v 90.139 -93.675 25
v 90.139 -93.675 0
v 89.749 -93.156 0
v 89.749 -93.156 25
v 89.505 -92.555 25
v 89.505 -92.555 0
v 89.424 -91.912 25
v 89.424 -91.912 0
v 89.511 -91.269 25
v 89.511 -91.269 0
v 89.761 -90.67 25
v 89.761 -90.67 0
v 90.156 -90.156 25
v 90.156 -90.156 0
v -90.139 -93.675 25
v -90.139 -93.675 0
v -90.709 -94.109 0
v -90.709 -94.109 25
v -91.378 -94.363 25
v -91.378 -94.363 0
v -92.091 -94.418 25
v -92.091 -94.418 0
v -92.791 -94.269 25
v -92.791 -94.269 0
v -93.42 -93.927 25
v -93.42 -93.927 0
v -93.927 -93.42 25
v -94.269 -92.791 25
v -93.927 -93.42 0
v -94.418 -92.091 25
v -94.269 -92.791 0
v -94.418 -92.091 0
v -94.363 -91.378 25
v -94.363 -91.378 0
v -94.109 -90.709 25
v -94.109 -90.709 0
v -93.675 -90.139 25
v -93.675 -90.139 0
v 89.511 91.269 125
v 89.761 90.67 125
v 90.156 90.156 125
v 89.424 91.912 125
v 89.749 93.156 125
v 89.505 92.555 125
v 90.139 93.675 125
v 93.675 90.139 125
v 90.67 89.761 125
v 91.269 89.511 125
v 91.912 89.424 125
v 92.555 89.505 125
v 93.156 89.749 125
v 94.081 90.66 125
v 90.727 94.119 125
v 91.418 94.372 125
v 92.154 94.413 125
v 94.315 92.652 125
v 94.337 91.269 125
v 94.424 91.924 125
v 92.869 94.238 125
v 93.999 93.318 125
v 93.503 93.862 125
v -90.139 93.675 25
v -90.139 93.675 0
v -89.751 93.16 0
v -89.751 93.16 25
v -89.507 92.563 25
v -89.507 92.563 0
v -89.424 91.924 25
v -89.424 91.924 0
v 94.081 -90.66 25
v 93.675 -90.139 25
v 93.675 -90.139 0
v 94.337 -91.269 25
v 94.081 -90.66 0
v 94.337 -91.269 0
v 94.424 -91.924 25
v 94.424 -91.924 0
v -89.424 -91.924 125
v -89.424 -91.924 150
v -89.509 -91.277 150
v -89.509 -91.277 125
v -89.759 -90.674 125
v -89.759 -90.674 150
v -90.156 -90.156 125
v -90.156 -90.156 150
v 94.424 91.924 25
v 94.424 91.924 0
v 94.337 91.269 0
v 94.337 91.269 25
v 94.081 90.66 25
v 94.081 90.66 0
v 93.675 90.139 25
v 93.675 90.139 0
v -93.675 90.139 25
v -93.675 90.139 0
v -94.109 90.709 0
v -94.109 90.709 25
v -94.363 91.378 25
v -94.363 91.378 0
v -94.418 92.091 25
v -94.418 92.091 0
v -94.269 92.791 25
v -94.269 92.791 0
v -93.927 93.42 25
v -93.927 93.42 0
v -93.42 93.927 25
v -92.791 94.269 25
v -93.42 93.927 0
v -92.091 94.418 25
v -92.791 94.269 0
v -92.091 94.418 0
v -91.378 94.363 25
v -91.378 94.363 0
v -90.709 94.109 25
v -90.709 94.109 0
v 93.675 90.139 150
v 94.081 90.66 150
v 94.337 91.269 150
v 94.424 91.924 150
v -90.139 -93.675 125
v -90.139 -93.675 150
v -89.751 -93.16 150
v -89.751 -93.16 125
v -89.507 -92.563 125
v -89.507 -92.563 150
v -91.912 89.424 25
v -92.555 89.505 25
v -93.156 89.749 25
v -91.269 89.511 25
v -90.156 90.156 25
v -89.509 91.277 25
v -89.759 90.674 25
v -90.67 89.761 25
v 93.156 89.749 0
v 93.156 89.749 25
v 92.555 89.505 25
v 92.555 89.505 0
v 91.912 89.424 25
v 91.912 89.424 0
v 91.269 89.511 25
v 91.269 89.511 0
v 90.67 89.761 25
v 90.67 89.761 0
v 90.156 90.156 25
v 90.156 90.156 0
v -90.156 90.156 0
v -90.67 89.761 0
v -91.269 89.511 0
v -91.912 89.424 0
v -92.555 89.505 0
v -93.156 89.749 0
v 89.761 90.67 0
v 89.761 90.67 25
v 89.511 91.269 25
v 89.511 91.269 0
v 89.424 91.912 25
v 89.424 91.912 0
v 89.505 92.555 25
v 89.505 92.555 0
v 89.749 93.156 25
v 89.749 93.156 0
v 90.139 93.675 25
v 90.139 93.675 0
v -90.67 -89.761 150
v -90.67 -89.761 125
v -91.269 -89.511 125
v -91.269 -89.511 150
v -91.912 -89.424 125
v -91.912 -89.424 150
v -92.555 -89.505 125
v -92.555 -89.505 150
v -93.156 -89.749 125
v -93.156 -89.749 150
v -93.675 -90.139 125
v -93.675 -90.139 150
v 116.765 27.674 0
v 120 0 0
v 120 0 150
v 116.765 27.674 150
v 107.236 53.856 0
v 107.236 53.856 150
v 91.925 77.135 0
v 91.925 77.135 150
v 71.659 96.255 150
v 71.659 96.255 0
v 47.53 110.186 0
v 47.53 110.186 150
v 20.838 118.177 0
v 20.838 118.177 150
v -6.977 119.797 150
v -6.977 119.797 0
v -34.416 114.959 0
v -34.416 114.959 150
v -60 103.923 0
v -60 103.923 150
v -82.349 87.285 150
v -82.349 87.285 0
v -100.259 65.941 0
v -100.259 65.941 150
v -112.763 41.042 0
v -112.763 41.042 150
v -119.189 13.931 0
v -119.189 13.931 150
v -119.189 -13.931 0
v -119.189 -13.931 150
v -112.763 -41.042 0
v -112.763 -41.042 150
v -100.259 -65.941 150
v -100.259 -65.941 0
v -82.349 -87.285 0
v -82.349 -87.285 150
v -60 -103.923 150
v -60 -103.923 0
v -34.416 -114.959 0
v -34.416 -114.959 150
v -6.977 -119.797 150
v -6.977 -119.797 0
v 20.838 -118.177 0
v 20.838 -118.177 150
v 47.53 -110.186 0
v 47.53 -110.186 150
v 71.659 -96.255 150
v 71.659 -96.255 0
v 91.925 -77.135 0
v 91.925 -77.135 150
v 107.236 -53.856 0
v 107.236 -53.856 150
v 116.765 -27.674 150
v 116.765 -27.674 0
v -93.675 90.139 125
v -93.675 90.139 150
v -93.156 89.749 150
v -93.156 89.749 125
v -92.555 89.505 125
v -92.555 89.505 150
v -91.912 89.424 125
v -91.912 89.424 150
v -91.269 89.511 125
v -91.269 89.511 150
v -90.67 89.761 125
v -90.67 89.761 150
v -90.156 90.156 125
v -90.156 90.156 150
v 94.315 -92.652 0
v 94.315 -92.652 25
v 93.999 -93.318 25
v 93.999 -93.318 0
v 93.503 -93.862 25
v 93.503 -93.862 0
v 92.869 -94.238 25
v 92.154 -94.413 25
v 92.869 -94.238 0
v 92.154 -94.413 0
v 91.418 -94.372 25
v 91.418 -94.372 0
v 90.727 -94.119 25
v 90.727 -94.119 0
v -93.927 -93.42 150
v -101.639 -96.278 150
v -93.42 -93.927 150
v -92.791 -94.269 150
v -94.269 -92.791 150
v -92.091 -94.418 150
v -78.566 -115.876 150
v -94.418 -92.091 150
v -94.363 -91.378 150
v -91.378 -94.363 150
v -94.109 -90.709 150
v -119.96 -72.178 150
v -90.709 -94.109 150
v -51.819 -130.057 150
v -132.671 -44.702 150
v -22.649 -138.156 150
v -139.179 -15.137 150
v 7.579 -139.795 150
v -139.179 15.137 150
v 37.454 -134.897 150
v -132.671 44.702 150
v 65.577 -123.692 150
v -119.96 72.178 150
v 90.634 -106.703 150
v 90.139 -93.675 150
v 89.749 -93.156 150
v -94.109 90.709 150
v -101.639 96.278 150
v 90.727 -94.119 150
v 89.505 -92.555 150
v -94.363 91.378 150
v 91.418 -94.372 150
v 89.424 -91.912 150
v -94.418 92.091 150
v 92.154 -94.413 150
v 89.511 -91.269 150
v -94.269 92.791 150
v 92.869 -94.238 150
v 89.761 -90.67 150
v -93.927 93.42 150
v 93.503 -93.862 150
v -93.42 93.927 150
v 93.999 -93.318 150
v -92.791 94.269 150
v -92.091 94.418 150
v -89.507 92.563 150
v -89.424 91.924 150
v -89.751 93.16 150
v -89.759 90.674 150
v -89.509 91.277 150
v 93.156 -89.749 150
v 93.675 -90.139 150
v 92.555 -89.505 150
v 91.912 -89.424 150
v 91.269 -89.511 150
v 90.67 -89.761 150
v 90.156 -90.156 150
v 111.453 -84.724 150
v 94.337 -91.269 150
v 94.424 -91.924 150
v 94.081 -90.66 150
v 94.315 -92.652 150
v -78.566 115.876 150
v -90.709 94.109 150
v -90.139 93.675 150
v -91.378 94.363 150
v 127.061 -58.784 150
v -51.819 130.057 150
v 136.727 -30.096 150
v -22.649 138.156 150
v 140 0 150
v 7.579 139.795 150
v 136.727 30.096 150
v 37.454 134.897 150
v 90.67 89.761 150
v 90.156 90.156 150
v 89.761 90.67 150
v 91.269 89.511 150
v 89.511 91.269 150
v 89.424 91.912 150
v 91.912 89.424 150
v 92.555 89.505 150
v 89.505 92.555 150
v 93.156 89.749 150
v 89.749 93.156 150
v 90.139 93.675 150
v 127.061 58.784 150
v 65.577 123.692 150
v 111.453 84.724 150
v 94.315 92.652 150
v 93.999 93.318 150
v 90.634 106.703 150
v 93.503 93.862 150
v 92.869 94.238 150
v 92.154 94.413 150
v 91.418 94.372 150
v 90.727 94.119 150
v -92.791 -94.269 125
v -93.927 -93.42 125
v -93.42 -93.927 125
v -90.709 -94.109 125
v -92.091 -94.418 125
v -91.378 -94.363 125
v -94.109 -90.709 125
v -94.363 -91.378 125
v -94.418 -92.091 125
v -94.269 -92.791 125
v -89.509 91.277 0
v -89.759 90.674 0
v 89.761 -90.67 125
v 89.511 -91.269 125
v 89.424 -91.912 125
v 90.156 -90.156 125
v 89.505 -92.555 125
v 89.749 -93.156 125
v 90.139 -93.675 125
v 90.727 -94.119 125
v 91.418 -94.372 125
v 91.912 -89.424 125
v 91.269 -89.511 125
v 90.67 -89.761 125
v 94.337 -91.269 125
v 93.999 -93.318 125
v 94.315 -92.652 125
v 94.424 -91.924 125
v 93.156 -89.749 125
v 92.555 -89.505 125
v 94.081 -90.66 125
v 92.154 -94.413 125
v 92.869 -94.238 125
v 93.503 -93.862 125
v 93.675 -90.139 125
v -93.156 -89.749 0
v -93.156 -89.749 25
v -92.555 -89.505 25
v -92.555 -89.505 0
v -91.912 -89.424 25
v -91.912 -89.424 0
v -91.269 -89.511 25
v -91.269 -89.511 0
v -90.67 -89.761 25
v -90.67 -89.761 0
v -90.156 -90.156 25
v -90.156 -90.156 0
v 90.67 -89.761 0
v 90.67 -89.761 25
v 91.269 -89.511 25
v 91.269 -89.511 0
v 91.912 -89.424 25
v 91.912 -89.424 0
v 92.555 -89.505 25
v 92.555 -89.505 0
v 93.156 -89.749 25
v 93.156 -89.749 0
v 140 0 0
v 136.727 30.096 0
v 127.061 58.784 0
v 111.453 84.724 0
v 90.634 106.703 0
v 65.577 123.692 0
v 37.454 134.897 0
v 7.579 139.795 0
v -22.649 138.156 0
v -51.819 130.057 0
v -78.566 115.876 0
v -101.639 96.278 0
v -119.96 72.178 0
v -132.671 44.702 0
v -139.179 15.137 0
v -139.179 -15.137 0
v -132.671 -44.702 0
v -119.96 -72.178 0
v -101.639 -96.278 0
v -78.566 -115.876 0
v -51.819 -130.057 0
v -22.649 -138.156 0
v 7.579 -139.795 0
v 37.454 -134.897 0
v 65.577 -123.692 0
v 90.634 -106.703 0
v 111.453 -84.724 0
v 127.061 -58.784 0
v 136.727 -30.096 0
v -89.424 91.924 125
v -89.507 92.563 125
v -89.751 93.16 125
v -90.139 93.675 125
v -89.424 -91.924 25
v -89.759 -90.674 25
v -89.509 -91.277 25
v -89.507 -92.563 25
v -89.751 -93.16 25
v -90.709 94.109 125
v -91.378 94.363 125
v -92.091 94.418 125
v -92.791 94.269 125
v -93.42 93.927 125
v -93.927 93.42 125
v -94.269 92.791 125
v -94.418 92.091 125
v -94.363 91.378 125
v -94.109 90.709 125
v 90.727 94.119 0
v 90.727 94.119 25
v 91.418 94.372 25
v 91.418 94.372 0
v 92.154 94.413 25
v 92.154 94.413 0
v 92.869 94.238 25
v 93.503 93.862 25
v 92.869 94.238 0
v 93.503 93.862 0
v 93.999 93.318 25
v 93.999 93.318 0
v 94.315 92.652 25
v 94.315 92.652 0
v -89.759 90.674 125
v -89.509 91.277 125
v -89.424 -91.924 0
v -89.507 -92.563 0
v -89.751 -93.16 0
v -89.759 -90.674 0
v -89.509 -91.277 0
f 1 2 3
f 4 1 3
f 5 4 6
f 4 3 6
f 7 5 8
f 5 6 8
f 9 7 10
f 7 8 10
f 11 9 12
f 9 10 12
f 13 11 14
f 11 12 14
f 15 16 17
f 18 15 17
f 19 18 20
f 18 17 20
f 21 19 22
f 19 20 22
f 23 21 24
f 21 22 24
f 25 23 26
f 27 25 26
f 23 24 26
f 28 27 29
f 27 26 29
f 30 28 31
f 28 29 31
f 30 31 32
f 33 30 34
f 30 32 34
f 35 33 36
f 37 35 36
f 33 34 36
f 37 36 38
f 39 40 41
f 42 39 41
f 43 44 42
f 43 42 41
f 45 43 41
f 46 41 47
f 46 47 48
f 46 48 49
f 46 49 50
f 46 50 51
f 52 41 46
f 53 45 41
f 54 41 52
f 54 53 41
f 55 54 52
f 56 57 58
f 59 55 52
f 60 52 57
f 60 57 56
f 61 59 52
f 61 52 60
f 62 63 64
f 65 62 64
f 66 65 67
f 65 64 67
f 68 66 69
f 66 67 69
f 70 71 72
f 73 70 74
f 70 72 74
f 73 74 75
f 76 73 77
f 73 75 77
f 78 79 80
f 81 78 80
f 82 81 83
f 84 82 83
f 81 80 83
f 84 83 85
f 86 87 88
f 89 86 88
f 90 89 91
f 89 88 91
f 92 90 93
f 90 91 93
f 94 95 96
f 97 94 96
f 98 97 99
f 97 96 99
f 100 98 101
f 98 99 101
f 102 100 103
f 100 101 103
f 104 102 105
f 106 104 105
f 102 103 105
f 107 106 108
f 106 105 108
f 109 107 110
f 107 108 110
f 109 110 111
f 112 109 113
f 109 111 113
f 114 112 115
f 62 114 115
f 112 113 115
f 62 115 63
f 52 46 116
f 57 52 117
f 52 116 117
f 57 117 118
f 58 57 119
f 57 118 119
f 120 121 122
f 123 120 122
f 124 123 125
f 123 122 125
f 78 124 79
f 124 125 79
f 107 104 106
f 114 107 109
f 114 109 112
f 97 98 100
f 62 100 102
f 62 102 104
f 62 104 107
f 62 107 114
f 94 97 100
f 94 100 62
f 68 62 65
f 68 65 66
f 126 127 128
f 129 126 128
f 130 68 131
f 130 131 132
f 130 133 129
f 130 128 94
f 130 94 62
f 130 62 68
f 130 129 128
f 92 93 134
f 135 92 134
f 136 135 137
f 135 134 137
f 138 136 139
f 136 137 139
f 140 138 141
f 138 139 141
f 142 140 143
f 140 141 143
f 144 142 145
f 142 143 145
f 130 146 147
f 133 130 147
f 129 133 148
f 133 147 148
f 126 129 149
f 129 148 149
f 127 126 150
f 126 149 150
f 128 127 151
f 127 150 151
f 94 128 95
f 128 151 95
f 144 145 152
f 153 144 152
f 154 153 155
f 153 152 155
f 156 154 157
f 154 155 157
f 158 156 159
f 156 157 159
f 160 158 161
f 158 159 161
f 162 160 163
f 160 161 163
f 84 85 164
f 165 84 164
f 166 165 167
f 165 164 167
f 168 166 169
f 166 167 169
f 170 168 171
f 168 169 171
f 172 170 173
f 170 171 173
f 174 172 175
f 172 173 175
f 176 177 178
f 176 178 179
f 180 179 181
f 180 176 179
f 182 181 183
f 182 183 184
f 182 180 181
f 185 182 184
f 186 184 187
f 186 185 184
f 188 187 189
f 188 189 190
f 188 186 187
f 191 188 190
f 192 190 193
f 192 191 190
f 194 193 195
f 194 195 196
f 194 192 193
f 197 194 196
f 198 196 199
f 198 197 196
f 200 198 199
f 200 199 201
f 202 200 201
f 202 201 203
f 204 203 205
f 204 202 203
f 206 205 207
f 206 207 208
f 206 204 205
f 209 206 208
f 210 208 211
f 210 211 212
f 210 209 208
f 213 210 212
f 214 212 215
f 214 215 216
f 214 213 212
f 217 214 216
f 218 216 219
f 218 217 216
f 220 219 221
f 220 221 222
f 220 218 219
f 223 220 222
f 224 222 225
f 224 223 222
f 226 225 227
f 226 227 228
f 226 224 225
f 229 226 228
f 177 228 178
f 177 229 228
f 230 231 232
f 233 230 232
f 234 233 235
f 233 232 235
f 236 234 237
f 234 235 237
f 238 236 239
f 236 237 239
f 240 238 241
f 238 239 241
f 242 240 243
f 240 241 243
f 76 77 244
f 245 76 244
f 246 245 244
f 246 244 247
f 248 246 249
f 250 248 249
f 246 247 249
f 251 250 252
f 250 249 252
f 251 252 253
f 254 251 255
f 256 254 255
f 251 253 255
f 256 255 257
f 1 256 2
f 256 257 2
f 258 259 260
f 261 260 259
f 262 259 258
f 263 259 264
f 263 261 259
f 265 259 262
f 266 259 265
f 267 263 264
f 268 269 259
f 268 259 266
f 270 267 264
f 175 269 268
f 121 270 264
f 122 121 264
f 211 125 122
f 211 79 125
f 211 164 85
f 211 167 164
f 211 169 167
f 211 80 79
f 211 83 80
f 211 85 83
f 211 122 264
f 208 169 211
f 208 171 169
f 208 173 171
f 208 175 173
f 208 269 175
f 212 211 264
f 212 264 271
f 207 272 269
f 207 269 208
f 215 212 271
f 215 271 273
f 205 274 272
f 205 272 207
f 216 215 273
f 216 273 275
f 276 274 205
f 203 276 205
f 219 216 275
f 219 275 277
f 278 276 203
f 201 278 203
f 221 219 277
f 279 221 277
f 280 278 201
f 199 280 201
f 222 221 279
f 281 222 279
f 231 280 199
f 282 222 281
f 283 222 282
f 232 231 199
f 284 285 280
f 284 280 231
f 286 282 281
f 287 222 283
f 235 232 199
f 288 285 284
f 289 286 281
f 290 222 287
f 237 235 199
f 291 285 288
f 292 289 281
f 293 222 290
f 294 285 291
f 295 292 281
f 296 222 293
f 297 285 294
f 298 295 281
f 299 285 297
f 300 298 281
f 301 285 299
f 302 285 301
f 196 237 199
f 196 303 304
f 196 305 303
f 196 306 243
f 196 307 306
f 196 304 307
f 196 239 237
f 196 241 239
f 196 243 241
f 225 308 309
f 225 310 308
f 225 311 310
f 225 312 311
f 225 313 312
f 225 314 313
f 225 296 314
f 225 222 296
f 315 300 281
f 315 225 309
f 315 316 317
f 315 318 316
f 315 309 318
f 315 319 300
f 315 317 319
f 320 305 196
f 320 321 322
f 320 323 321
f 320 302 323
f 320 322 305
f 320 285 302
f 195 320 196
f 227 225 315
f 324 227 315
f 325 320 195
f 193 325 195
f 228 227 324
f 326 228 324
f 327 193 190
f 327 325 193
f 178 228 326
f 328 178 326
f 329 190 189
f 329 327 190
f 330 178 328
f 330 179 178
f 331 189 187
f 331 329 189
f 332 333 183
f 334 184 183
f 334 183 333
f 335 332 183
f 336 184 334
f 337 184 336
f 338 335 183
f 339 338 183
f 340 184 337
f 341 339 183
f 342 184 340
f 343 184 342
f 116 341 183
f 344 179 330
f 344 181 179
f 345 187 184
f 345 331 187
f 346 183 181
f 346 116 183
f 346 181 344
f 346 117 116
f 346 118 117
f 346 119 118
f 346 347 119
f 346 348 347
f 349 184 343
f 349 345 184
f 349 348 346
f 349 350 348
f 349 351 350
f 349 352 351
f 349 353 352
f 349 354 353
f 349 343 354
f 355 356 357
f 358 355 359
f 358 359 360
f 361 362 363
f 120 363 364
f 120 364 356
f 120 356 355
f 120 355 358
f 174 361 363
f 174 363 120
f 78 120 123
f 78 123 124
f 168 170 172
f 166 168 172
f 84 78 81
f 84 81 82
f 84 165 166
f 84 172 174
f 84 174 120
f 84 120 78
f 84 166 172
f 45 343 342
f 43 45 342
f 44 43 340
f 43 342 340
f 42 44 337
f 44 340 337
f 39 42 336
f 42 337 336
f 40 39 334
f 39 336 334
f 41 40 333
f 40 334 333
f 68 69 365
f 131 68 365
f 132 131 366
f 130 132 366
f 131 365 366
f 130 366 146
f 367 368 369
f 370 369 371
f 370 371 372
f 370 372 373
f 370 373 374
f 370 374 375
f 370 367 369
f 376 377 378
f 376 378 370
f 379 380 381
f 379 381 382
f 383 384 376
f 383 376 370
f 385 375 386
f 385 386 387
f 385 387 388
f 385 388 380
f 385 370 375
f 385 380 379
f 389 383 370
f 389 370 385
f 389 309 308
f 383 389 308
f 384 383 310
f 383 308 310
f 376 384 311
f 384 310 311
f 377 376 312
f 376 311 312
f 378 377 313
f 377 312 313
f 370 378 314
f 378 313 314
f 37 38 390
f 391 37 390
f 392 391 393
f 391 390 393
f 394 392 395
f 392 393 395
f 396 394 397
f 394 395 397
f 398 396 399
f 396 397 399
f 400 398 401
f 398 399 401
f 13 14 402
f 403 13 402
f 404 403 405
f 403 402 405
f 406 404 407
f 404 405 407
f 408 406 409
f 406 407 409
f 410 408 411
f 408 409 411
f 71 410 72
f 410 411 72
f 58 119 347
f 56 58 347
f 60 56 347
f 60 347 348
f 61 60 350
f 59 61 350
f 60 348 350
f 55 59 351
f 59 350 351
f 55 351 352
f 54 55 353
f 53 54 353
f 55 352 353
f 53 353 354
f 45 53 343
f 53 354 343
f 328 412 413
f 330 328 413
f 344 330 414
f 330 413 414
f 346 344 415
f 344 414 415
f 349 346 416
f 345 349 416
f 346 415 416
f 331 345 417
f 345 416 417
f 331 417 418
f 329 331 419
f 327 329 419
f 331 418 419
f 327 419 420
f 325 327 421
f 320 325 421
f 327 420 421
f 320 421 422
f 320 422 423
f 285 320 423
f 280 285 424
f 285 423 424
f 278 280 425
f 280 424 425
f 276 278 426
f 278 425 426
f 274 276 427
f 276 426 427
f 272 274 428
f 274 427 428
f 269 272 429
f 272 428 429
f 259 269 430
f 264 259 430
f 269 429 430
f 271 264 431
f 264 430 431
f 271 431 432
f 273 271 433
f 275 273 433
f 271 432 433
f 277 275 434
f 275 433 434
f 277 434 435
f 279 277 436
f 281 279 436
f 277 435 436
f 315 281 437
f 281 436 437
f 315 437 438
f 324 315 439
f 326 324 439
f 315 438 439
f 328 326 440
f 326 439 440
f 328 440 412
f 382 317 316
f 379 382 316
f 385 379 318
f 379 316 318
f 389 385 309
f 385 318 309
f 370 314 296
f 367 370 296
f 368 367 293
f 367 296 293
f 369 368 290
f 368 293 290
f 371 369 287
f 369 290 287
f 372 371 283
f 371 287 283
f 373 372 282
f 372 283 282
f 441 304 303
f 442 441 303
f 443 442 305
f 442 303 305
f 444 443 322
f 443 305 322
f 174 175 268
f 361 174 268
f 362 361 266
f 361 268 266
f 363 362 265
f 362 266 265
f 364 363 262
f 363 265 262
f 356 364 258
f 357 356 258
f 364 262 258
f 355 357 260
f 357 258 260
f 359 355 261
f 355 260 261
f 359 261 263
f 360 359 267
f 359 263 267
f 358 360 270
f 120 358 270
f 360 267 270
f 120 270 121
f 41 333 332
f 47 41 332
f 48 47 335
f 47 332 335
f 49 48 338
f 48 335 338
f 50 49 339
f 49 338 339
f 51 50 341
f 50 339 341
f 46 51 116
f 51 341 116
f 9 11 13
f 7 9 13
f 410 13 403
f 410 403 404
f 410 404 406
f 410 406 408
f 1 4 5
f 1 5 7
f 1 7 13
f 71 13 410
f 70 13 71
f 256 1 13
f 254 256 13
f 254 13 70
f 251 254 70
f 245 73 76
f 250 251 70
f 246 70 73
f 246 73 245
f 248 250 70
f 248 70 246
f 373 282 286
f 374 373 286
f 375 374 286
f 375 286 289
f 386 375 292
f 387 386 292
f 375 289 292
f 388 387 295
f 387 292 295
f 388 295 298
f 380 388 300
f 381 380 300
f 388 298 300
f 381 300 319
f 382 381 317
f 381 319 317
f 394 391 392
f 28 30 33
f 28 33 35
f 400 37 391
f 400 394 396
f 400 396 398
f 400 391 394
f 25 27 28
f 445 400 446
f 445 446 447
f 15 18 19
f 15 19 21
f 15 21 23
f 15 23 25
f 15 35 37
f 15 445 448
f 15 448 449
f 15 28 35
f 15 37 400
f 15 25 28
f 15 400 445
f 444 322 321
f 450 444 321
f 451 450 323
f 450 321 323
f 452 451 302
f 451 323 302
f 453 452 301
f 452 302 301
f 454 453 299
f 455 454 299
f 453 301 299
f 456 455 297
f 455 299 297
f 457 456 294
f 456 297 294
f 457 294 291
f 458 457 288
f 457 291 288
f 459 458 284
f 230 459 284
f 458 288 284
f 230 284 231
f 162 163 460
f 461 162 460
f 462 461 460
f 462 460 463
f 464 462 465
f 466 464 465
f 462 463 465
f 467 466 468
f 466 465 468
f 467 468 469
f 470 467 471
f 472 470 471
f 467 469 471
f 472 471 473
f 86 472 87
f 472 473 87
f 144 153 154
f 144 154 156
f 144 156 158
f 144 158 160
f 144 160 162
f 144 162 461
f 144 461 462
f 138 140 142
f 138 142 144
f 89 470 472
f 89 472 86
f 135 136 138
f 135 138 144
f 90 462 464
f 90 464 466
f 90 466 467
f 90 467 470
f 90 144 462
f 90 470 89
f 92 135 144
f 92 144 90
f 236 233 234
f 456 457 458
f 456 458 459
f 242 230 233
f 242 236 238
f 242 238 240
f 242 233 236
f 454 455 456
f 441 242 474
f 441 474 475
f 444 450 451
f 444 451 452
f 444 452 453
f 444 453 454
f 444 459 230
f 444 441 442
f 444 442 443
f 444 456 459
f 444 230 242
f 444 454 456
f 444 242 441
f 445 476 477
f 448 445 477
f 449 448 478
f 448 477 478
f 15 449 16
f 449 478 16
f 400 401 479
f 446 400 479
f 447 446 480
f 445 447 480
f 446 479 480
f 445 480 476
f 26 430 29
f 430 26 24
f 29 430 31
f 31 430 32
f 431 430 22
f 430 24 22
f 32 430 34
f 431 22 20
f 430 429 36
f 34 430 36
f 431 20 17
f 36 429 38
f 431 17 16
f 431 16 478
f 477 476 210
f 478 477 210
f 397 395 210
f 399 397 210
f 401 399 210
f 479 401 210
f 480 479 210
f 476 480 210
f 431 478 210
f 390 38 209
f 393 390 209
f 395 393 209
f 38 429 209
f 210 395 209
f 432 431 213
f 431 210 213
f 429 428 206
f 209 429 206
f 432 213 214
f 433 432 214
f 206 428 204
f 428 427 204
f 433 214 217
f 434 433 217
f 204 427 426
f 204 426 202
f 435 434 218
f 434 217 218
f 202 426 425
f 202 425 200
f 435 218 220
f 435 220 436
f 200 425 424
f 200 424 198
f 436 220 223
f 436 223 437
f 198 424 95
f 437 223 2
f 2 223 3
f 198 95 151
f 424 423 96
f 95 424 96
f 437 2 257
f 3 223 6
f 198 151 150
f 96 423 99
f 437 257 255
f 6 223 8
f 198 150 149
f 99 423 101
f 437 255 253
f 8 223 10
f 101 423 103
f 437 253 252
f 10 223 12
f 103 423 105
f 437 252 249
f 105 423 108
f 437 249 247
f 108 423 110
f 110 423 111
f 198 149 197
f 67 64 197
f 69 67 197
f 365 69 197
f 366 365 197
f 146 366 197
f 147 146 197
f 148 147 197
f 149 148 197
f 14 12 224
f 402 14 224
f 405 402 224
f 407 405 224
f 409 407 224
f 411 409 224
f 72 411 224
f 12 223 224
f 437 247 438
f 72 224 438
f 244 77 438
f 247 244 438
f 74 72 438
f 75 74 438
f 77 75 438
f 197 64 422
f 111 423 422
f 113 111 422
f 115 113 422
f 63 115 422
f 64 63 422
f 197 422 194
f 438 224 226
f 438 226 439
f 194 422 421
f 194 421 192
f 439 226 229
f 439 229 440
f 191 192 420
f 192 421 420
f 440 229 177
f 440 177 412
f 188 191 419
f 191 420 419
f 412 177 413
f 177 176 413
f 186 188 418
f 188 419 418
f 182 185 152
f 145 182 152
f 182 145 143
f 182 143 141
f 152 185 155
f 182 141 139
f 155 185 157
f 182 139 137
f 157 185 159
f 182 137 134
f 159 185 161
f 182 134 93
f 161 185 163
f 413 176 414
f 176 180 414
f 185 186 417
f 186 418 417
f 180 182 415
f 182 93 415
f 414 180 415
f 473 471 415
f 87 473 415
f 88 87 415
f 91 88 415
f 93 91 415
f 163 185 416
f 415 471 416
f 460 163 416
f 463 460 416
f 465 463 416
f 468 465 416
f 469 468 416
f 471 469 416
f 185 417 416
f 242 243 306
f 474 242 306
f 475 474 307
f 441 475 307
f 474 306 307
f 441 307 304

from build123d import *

# Parameters (mm, degrees)
F0_R     = 140
F0_R_2   = 120
F1_DEPTH = 150
F3_DEPTH = 25
F5_DEPTH = 25


with BuildPart() as f1:
    # F0 (on Top) → F1 (new body)
    with BuildSketch(Plane.XY):
        Circle(F0_R)
        Circle(F0_R_2, mode=Mode.SUBTRACT)
    extrude(amount=F1_DEPTH)

    # F2 (on face) → F3 (cut)
    with BuildSketch(Plane.XY.offset(150)):
        with BuildLine():
            ThreePointArc((-91.923882, 91.923882), (-91.035749, 92.803515), (-90.139199, 93.674569))
            ThreePointArc((-90.139199, 93.674569), (-93.691649, 93.691649), (-93.674569, 90.139199))
            ThreePointArc((-93.674569, 90.139199), (-92.803515, 91.035749), (-91.923882, 91.923882))
        make_face()
        with BuildLine():
            Line((-90.156115, 90.156115), (-91.923882, 91.923882))
            ThreePointArc((-91.923882, 91.923882), (-92.803515, 91.035749), (-93.674569, 90.139199))
            ThreePointArc((-93.674569, 90.139199), (-91.911862, 89.42391), (-90.156115, 90.156115))
        make_face()
        with BuildLine():
            ThreePointArc((-89.423882, 91.923882), (-89.60961, 92.869475), (-90.139199, 93.674569))
            ThreePointArc((-90.139199, 93.674569), (-91.035749, 92.803515), (-91.923882, 91.923882))
            Line((-91.923882, 91.923882), (-90.156115, 90.156115))
            ThreePointArc((-90.156115, 90.156115), (-89.614183, 90.967173), (-89.423882, 91.923882))
        make_face()
        with BuildLine():
            ThreePointArc((91.923882, 91.923882), (92.803515, 91.035749), (93.674569, 90.139199))
            ThreePointArc((93.674569, 90.139199), (94.228954, 90.95608), (94.423882, 91.923882))
            ThreePointArc((94.423882, 91.923882), (92.869475, 94.238153), (90.139199, 93.674569))
            ThreePointArc((90.139199, 93.674569), (91.035749, 92.803515), (91.923882, 91.923882))
        make_face()
        with BuildLine():
            Line((90.156115, 90.156115), (91.923882, 91.923882))
            ThreePointArc((91.923882, 91.923882), (91.035749, 92.803515), (90.139199, 93.674569))
            ThreePointArc((90.139199, 93.674569), (89.42391, 91.911862), (90.156115, 90.156115))
        make_face()
        with BuildLine():
            ThreePointArc((90.156115, 90.156115), (91.911862, 89.42391), (93.674569, 90.139199))
            ThreePointArc((93.674569, 90.139199), (92.803515, 91.035749), (91.923882, 91.923882))
            Line((91.923882, 91.923882), (90.156115, 90.156115))
        make_face()
        with BuildLine():
            ThreePointArc((90.139199, -93.674569), (91.035749, -92.803515), (91.923882, -91.923882))
            Line((91.923882, -91.923882), (90.156115, -90.156115))
            ThreePointArc((90.156115, -90.156115), (89.42391, -91.911862), (90.139199, -93.674569))
        make_face()
        with BuildLine():
            ThreePointArc((91.923882, -91.923882), (92.803515, -91.035749), (93.674569, -90.139199))
            ThreePointArc((93.674569, -90.139199), (91.911862, -89.42391), (90.156115, -90.156115))
            Line((90.156115, -90.156115), (91.923882, -91.923882))
        make_face()
        with BuildLine():
            ThreePointArc((94.423882, -91.923882), (94.228954, -90.95608), (93.674569, -90.139199))
            ThreePointArc((93.674569, -90.139199), (92.803515, -91.035749), (91.923882, -91.923882))
            ThreePointArc((91.923882, -91.923882), (91.035749, -92.803515), (90.139199, -93.674569))
            ThreePointArc((90.139199, -93.674569), (92.869475, -94.238153), (94.423882, -91.923882))
        make_face()
        with BuildLine():
            ThreePointArc((-91.923882, -91.923882), (-91.035749, -92.803515), (-90.139199, -93.674569))
            ThreePointArc((-90.139199, -93.674569), (-89.60961, -92.869475), (-89.423882, -91.923882))
            ThreePointArc((-89.423882, -91.923882), (-89.614183, -90.967173), (-90.156115, -90.156115))
            Line((-90.156115, -90.156115), (-91.923882, -91.923882))
        make_face()
        with BuildLine():
            ThreePointArc((-93.674569, -90.139199), (-92.803515, -91.035749), (-91.923882, -91.923882))
            Line((-91.923882, -91.923882), (-90.156115, -90.156115))
            ThreePointArc((-90.156115, -90.156115), (-91.911862, -89.42391), (-93.674569, -90.139199))
        make_face()
        with BuildLine():
            ThreePointArc((-93.674569, -90.139199), (-93.691649, -93.691649), (-90.139199, -93.674569))
            ThreePointArc((-90.139199, -93.674569), (-91.035749, -92.803515), (-91.923882, -91.923882))
            ThreePointArc((-91.923882, -91.923882), (-92.803515, -91.035749), (-93.674569, -90.139199))
        make_face()
    extrude(amount=-F3_DEPTH, mode=Mode.SUBTRACT)

    # F4 (on face) → F5 (cut)
    with BuildSketch(Plane(origin=(0, 0, 0), x_dir=(1, 0, 0), z_dir=(0, 0, -1))):
        with BuildLine():
            ThreePointArc((-91.923882, 91.923882), (-91.035749, 92.803515), (-90.139199, 93.674569))
            ThreePointArc((-90.139199, 93.674569), (-93.691649, 93.691649), (-93.674569, 90.139199))
            ThreePointArc((-93.674569, 90.139199), (-92.803515, 91.035749), (-91.923882, 91.923882))
        make_face()
        with BuildLine():
            Line((-90.156115, 90.156115), (-91.923882, 91.923882))
            ThreePointArc((-91.923882, 91.923882), (-92.803515, 91.035749), (-93.674569, 90.139199))
            ThreePointArc((-93.674569, 90.139199), (-91.911862, 89.42391), (-90.156115, 90.156115))
        make_face()
        with BuildLine():
            ThreePointArc((-89.423882, 91.923882), (-89.60961, 92.869475), (-90.139199, 93.674569))
            ThreePointArc((-90.139199, 93.674569), (-91.035749, 92.803515), (-91.923882, 91.923882))
            Line((-91.923882, 91.923882), (-90.156115, 90.156115))
            ThreePointArc((-90.156115, 90.156115), (-89.614183, 90.967173), (-89.423882, 91.923882))
        make_face()
        with BuildLine():
            ThreePointArc((-93.674569, -90.139199), (-92.803515, -91.035749), (-91.923882, -91.923882))
            Line((-91.923882, -91.923882), (-90.156115, -90.156115))
            ThreePointArc((-90.156115, -90.156115), (-91.911862, -89.42391), (-93.674569, -90.139199))
        make_face()
        with BuildLine():
            ThreePointArc((-91.923882, -91.923882), (-91.035749, -92.803515), (-90.139199, -93.674569))
            ThreePointArc((-90.139199, -93.674569), (-89.60961, -92.869475), (-89.423882, -91.923882))
            ThreePointArc((-89.423882, -91.923882), (-89.614183, -90.967173), (-90.156115, -90.156115))
            Line((-90.156115, -90.156115), (-91.923882, -91.923882))
        make_face()
        with BuildLine():
            ThreePointArc((-93.674569, -90.139199), (-93.691649, -93.691649), (-90.139199, -93.674569))
            ThreePointArc((-90.139199, -93.674569), (-91.035749, -92.803515), (-91.923882, -91.923882))
            ThreePointArc((-91.923882, -91.923882), (-92.803515, -91.035749), (-93.674569, -90.139199))
        make_face()
        with BuildLine():
            ThreePointArc((94.423882, -91.923882), (94.228954, -90.95608), (93.674569, -90.139199))
            ThreePointArc((93.674569, -90.139199), (92.803515, -91.035749), (91.923882, -91.923882))
            ThreePointArc((91.923882, -91.923882), (91.035749, -92.803515), (90.139199, -93.674569))
            ThreePointArc((90.139199, -93.674569), (92.869475, -94.238153), (94.423882, -91.923882))
        make_face()
        with BuildLine():
            ThreePointArc((91.923882, -91.923882), (92.803515, -91.035749), (93.674569, -90.139199))
            ThreePointArc((93.674569, -90.139199), (91.911862, -89.42391), (90.156115, -90.156115))
            Line((90.156115, -90.156115), (91.923882, -91.923882))
        make_face()
        with BuildLine():
            ThreePointArc((90.139199, -93.674569), (91.035749, -92.803515), (91.923882, -91.923882))
            Line((91.923882, -91.923882), (90.156115, -90.156115))
            ThreePointArc((90.156115, -90.156115), (89.42391, -91.911862), (90.139199, -93.674569))
        make_face()
        with BuildLine():
            Line((90.156115, 90.156115), (91.923882, 91.923882))
            ThreePointArc((91.923882, 91.923882), (91.035749, 92.803515), (90.139199, 93.674569))
            ThreePointArc((90.139199, 93.674569), (89.42391, 91.911862), (90.156115, 90.156115))
        make_face()
        with BuildLine():
            ThreePointArc((90.156115, 90.156115), (91.911862, 89.42391), (93.674569, 90.139199))
            ThreePointArc((93.674569, 90.139199), (92.803515, 91.035749), (91.923882, 91.923882))
            Line((91.923882, 91.923882), (90.156115, 90.156115))
        make_face()
        with BuildLine():
            ThreePointArc((91.923882, 91.923882), (92.803515, 91.035749), (93.674569, 90.139199))
            ThreePointArc((93.674569, 90.139199), (94.228954, 90.95608), (94.423882, 91.923882))
            ThreePointArc((94.423882, 91.923882), (92.869475, 94.238153), (90.139199, 93.674569))
            ThreePointArc((90.139199, 93.674569), (91.035749, 92.803515), (91.923882, 91.923882))
        make_face()
    extrude(amount=-F5_DEPTH, mode=Mode.SUBTRACT)


solid = f1.part
